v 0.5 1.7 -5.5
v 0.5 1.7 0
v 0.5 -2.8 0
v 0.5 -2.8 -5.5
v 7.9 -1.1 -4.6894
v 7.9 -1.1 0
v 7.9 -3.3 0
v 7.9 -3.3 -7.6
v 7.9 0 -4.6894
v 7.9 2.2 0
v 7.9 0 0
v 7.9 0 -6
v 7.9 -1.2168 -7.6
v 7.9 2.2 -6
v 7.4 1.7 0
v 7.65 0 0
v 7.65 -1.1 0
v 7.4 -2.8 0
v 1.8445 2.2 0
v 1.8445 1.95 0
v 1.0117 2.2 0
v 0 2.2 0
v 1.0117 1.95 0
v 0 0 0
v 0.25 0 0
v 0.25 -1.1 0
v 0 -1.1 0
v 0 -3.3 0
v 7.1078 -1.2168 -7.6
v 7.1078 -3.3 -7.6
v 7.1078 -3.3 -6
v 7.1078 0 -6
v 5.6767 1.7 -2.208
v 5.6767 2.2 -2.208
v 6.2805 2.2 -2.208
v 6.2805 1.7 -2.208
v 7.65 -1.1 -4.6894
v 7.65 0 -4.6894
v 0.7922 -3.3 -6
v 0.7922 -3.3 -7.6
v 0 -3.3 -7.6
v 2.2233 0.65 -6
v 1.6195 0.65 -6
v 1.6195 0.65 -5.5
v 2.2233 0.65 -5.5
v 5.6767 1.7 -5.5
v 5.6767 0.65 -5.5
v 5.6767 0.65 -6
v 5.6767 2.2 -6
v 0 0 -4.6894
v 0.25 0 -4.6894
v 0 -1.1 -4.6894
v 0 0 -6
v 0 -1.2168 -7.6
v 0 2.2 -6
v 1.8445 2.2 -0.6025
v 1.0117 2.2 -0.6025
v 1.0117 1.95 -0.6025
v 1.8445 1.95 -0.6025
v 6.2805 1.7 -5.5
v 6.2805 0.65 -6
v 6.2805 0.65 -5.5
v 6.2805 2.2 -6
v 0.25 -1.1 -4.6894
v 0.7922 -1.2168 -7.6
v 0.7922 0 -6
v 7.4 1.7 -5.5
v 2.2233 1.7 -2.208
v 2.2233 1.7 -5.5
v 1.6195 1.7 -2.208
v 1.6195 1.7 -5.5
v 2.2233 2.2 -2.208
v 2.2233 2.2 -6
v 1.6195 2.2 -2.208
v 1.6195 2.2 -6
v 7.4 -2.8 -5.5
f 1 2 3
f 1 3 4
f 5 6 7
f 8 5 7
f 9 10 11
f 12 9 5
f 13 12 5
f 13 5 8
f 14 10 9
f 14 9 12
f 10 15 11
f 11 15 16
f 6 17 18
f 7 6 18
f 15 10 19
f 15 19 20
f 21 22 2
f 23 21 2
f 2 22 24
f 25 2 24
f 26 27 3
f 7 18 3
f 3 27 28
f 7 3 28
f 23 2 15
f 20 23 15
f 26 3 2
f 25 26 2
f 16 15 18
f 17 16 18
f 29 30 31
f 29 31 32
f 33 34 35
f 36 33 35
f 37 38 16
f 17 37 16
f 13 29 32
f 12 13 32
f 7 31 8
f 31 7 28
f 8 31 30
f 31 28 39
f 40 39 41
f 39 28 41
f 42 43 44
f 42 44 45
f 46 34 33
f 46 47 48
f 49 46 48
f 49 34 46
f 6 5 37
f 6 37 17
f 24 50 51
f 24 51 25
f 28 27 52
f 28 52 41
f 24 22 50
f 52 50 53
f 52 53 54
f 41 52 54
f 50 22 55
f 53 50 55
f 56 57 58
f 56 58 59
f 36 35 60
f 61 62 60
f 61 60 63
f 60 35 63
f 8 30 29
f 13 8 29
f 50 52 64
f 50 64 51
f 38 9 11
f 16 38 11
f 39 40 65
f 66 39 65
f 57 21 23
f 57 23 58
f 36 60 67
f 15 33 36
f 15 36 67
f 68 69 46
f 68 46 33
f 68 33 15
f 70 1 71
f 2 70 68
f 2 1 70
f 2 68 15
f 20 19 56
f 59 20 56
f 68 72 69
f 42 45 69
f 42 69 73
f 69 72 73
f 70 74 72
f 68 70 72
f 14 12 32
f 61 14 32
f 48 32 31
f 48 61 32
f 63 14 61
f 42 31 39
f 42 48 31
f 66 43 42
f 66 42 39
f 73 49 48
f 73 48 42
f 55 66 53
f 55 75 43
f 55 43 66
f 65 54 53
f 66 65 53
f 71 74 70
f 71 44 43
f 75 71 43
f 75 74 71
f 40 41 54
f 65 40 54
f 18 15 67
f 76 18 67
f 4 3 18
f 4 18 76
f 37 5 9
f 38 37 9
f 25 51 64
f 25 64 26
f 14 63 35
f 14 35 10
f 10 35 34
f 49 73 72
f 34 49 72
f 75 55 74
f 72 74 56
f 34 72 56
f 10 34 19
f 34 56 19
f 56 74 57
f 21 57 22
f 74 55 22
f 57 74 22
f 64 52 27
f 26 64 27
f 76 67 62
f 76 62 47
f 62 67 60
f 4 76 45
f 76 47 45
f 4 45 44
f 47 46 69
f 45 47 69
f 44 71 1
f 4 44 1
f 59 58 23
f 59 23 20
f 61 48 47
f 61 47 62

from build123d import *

# Parameters (mm, degrees)
BOSS_EXTRUDE1_DEPTH = 7.9
SKETCH4_W           = 6.315653724
SKETCH4_H           = 4.166384482
CUT_EXTRUDE2_DEPTH  = 1.6
SHELL1_T            = -0.5
SKETCH2_W           = 0.603812539
SKETCH2_H           = 7.583931724
CUT_EXTRUDE1_DEPTH  = 1.55
SKETCH5_W           = 0.832806424
SKETCH5_H           = 1.205065976
CUT_EXTRUDE3_DEPTH  = 0.25
SKETCH6_W           = 9.378889646
SKETCH6_H           = 1.1
CUT_EXTRUDE4_DEPTH  = 0.25


with BuildPart() as part:
    # Sketch1 → Boss-Extrude1 (new body)
    with BuildSketch(Plane(origin=(0, 0, 0), x_dir=(0, 0, -1), z_dir=(1, 0, 0))):
        Polygon((0, 0), (0, -3.3), (7.6, -3.3), (7.6, -1.216807759), (6, 0), (6, 2.2), (0, 2.2), align=None)
    extrude(amount=BOSS_EXTRUDE1_DEPTH)

    # Sketch4 → Cut-Extrude2 (cut)
    with BuildSketch(Plane(origin=(0, 0, -7.6), x_dir=(-1, 0, 0), z_dir=(0, 0, -1))):
        with Locations((-3.95, -1.216807759)):
            Rectangle(SKETCH4_W, SKETCH4_H)
    extrude(amount=-CUT_EXTRUDE2_DEPTH, mode=Mode.SUBTRACT)

    # Shell1
    shell1_openings = [part.faces().sort_by_distance(p)[0] for p in [
        (3.95, -0.55, 0),
    ]]
    offset(amount=SHELL1_T, openings=shell1_openings, kind=Kind.INTERSECTION)

    # Sketch2 → Cut-Extrude1 (cut)
    with BuildSketch(Plane(origin=(0, 2.2, 0), x_dir=(1, 0, 0), z_dir=(0, 1, 0))):
        with Locations((5.978601851, 6)):
            Rectangle(SKETCH2_W, SKETCH2_H)
        with Locations((1.92139815, 6)):
            Rectangle(SKETCH2_W, SKETCH2_H)
    extrude(amount=-CUT_EXTRUDE1_DEPTH, mode=Mode.SUBTRACT)

    # Sketch5 → Cut-Extrude3 (cut)
    with BuildSketch(Plane(origin=(0, 2.2, 0), x_dir=(1, 0, 0), z_dir=(0, 1, 0))):
        with Locations((1.428135285, 0)):
            Rectangle(SKETCH5_W, SKETCH5_H)
    extrude(amount=-CUT_EXTRUDE3_DEPTH, mode=Mode.SUBTRACT)

    # Sketch6 → Cut-Extrude4 (cut)
    with BuildSketch(Plane.ZY):
        with Locations((0, -0.55)):
            Rectangle(SKETCH6_W, SKETCH6_H)
    cut_extrude4 = extrude(amount=-CUT_EXTRUDE4_DEPTH, mode=Mode.SUBTRACT)

    # Mirror1: Cut-Extrude4 across plane
    add(cut_extrude4.mirror(Plane.ZY.offset(-3.95)), mode=Mode.SUBTRACT)


solid = part.part
